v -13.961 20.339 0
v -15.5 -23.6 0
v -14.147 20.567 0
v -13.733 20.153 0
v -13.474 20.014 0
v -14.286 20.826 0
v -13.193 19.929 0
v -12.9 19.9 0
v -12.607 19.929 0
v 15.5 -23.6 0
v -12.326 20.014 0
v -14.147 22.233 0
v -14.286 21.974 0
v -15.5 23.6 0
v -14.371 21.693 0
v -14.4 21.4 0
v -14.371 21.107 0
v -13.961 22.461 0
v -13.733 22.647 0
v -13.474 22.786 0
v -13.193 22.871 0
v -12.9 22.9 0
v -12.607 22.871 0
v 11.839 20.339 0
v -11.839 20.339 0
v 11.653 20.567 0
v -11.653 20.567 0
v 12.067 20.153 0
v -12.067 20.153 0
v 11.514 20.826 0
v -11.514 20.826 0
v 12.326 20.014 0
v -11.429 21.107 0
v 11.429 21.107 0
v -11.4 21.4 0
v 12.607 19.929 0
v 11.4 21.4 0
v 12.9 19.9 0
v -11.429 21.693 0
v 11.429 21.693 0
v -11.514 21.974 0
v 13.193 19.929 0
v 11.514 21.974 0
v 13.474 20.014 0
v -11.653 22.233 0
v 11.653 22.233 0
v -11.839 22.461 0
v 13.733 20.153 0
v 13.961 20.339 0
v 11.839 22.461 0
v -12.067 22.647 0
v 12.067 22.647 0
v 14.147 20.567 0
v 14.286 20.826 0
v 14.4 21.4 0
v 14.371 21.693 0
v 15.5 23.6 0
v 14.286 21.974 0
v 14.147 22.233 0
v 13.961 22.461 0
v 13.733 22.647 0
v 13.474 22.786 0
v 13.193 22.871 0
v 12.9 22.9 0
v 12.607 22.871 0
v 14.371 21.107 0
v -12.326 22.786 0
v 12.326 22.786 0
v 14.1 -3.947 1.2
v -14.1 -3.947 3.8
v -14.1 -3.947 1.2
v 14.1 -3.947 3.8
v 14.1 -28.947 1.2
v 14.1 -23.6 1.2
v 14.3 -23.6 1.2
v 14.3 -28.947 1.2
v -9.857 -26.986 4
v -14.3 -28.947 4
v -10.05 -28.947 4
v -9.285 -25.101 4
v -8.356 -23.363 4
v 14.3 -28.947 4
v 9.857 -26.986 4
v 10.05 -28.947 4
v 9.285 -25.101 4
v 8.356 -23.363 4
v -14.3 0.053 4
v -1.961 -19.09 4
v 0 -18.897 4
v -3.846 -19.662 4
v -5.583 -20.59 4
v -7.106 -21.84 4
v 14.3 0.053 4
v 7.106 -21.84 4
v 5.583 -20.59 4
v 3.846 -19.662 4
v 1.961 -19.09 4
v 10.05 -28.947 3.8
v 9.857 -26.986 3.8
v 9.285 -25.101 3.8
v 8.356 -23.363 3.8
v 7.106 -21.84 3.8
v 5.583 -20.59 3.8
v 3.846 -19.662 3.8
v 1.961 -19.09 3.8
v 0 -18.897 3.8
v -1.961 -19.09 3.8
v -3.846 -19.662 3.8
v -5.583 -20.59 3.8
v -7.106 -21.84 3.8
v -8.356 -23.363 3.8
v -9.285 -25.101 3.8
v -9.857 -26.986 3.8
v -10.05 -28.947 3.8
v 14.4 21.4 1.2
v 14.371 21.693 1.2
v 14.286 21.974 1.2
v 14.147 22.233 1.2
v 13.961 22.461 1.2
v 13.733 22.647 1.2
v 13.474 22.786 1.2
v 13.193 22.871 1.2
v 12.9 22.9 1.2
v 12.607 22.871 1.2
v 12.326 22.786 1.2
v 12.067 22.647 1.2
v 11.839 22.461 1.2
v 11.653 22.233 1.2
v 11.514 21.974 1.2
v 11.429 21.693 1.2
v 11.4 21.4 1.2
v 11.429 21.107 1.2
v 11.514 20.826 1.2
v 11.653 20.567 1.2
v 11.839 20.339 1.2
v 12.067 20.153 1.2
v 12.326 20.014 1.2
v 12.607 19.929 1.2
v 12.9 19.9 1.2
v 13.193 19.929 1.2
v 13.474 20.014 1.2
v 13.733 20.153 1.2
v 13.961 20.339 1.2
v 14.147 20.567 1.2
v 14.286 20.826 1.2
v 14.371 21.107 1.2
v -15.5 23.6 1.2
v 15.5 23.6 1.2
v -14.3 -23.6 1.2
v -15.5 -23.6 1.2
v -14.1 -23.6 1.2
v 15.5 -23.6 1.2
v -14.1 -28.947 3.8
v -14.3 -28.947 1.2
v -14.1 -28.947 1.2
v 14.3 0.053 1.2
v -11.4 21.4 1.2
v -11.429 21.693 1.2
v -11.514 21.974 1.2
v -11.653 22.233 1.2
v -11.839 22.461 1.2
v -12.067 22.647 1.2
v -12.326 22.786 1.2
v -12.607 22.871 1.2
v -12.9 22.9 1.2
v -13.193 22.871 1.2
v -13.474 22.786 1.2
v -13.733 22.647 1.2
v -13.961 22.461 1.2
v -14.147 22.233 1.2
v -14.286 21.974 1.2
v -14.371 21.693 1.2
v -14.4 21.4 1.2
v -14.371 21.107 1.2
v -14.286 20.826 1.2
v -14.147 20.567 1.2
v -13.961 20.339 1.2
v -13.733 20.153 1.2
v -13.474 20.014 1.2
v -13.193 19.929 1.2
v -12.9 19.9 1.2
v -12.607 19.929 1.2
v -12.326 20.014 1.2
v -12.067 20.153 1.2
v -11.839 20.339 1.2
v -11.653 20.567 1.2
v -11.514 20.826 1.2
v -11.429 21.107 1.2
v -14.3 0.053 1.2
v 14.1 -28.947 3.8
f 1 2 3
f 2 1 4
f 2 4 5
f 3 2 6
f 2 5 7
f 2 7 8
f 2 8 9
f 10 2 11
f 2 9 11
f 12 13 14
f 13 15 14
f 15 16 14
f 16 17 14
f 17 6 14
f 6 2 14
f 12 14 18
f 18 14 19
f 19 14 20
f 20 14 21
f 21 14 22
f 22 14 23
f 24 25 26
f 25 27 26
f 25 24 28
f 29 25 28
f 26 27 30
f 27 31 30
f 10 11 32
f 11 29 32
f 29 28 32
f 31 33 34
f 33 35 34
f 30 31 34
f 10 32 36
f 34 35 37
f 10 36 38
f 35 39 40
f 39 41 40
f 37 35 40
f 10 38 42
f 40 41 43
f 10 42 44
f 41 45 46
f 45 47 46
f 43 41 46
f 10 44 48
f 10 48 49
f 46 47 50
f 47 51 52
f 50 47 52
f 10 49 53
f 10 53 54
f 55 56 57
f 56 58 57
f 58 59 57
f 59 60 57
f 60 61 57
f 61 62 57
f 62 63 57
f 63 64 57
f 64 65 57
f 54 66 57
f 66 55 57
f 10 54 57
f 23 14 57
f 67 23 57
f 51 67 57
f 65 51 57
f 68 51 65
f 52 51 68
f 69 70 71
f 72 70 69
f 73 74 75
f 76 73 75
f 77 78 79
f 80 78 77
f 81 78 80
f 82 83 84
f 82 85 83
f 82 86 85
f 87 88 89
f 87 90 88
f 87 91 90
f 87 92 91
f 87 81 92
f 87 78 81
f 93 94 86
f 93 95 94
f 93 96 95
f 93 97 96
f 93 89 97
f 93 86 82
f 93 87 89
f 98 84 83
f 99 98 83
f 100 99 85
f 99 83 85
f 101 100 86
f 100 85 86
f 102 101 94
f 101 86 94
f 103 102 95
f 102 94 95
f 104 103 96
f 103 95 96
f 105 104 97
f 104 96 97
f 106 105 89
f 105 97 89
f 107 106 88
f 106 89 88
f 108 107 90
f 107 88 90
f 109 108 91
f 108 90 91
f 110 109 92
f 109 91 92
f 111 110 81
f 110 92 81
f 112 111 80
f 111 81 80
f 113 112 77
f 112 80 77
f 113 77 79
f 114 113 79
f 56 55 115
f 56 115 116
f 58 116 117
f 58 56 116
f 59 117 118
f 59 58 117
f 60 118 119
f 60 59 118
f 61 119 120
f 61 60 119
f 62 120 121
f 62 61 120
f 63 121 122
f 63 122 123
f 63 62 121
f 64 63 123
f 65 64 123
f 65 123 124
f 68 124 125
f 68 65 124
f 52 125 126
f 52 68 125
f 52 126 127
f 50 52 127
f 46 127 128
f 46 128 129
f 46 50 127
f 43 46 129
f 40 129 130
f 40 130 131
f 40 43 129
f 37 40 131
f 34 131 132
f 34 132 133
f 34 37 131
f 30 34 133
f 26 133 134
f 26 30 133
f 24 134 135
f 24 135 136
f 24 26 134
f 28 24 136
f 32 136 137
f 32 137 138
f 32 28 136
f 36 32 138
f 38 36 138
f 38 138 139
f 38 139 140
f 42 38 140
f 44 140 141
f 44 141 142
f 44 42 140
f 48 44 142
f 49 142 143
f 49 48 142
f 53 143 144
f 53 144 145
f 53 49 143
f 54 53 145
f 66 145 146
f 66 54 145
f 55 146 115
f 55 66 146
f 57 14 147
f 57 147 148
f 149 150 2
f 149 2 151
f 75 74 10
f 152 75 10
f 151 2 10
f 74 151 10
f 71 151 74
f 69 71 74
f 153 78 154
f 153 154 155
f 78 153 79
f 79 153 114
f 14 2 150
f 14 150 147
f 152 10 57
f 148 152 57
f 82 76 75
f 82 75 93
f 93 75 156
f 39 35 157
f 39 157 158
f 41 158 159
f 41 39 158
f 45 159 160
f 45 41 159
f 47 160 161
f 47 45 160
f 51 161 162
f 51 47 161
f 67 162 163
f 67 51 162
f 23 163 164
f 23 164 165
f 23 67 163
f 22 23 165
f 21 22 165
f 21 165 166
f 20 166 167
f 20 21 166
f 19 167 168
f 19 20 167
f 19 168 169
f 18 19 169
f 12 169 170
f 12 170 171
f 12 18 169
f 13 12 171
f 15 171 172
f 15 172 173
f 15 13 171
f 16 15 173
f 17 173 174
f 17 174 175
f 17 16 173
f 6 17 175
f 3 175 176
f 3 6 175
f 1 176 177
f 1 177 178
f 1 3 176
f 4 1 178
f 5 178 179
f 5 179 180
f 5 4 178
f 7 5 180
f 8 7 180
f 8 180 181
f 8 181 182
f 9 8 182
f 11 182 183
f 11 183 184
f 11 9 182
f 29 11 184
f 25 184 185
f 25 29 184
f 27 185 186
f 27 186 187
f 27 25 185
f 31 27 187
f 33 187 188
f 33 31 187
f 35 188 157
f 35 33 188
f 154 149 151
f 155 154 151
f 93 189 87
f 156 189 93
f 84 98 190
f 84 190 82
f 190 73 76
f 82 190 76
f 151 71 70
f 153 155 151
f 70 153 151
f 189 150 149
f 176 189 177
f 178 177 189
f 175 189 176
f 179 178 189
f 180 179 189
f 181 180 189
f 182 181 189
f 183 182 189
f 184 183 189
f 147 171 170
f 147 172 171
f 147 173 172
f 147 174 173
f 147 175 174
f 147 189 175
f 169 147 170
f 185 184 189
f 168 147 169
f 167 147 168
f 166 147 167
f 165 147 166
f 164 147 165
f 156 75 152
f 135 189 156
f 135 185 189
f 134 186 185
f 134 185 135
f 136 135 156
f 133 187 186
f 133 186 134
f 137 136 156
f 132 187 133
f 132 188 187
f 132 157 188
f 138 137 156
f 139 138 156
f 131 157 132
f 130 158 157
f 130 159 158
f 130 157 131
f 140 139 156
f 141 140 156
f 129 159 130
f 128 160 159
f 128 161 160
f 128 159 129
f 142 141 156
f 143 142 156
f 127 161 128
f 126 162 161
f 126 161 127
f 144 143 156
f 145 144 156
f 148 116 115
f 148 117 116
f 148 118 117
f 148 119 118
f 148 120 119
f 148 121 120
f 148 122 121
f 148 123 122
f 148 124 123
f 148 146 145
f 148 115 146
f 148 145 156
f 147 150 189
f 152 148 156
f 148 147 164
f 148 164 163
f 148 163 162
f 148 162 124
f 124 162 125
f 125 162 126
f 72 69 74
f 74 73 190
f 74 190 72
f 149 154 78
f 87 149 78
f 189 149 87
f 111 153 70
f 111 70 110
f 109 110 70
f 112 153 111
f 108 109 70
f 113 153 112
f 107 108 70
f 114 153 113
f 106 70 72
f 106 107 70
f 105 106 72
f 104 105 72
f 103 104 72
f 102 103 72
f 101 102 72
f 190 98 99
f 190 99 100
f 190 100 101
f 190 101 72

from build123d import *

# Parameters (mm, degrees)
F0_W     = 31
F0_H     = 47.2
F0_R     = 1.5
F1_DEPTH = 1.2
F2_W     = 28.6
F2_H     = 29
F3_DEPTH = 2.8
F4_W     = 28.2
F4_H     = 2.6
F5_DEPTH = 25
F7_DEPTH = 0.2


with BuildPart() as f1:
    # F0 (on Top) → F1 (new body)
    with BuildSketch(Plane.XY):
        Rectangle(F0_W, F0_H)
        with Locations((-12.9, 21.4)):
            Circle(F0_R, mode=Mode.SUBTRACT)
        with Locations((12.9, 21.4)):
            Circle(F0_R, mode=Mode.SUBTRACT)
    extrude(amount=F1_DEPTH)

    # F2 (on face) → F3 (join)
    with BuildSketch(Plane.XY.offset(1.2)):
        with Locations((0, -14.446534)):
            Rectangle(F2_W, F2_H)
    extrude(amount=F3_DEPTH)

    # F4 (on face) → F5 (cut)
    with BuildSketch(Plane.XZ.offset(28.946534)):
        with Locations((0, 2.5)):
            Rectangle(F4_W, F4_H)
    extrude(amount=-F5_DEPTH, mode=Mode.SUBTRACT)

    # F6 (on face) → F7 (cut, through all)
    with BuildSketch(Plane.XY.offset(4)):
        with BuildLine():
            Line((-10.05, -28.946534), (10.05, -28.946534))
            ThreePointArc((10.05, -28.946534), (0, -18.896534), (-10.05, -28.946534))
        make_face()
    extrude(amount=-F7_DEPTH, mode=Mode.SUBTRACT)


solid = f1.part
